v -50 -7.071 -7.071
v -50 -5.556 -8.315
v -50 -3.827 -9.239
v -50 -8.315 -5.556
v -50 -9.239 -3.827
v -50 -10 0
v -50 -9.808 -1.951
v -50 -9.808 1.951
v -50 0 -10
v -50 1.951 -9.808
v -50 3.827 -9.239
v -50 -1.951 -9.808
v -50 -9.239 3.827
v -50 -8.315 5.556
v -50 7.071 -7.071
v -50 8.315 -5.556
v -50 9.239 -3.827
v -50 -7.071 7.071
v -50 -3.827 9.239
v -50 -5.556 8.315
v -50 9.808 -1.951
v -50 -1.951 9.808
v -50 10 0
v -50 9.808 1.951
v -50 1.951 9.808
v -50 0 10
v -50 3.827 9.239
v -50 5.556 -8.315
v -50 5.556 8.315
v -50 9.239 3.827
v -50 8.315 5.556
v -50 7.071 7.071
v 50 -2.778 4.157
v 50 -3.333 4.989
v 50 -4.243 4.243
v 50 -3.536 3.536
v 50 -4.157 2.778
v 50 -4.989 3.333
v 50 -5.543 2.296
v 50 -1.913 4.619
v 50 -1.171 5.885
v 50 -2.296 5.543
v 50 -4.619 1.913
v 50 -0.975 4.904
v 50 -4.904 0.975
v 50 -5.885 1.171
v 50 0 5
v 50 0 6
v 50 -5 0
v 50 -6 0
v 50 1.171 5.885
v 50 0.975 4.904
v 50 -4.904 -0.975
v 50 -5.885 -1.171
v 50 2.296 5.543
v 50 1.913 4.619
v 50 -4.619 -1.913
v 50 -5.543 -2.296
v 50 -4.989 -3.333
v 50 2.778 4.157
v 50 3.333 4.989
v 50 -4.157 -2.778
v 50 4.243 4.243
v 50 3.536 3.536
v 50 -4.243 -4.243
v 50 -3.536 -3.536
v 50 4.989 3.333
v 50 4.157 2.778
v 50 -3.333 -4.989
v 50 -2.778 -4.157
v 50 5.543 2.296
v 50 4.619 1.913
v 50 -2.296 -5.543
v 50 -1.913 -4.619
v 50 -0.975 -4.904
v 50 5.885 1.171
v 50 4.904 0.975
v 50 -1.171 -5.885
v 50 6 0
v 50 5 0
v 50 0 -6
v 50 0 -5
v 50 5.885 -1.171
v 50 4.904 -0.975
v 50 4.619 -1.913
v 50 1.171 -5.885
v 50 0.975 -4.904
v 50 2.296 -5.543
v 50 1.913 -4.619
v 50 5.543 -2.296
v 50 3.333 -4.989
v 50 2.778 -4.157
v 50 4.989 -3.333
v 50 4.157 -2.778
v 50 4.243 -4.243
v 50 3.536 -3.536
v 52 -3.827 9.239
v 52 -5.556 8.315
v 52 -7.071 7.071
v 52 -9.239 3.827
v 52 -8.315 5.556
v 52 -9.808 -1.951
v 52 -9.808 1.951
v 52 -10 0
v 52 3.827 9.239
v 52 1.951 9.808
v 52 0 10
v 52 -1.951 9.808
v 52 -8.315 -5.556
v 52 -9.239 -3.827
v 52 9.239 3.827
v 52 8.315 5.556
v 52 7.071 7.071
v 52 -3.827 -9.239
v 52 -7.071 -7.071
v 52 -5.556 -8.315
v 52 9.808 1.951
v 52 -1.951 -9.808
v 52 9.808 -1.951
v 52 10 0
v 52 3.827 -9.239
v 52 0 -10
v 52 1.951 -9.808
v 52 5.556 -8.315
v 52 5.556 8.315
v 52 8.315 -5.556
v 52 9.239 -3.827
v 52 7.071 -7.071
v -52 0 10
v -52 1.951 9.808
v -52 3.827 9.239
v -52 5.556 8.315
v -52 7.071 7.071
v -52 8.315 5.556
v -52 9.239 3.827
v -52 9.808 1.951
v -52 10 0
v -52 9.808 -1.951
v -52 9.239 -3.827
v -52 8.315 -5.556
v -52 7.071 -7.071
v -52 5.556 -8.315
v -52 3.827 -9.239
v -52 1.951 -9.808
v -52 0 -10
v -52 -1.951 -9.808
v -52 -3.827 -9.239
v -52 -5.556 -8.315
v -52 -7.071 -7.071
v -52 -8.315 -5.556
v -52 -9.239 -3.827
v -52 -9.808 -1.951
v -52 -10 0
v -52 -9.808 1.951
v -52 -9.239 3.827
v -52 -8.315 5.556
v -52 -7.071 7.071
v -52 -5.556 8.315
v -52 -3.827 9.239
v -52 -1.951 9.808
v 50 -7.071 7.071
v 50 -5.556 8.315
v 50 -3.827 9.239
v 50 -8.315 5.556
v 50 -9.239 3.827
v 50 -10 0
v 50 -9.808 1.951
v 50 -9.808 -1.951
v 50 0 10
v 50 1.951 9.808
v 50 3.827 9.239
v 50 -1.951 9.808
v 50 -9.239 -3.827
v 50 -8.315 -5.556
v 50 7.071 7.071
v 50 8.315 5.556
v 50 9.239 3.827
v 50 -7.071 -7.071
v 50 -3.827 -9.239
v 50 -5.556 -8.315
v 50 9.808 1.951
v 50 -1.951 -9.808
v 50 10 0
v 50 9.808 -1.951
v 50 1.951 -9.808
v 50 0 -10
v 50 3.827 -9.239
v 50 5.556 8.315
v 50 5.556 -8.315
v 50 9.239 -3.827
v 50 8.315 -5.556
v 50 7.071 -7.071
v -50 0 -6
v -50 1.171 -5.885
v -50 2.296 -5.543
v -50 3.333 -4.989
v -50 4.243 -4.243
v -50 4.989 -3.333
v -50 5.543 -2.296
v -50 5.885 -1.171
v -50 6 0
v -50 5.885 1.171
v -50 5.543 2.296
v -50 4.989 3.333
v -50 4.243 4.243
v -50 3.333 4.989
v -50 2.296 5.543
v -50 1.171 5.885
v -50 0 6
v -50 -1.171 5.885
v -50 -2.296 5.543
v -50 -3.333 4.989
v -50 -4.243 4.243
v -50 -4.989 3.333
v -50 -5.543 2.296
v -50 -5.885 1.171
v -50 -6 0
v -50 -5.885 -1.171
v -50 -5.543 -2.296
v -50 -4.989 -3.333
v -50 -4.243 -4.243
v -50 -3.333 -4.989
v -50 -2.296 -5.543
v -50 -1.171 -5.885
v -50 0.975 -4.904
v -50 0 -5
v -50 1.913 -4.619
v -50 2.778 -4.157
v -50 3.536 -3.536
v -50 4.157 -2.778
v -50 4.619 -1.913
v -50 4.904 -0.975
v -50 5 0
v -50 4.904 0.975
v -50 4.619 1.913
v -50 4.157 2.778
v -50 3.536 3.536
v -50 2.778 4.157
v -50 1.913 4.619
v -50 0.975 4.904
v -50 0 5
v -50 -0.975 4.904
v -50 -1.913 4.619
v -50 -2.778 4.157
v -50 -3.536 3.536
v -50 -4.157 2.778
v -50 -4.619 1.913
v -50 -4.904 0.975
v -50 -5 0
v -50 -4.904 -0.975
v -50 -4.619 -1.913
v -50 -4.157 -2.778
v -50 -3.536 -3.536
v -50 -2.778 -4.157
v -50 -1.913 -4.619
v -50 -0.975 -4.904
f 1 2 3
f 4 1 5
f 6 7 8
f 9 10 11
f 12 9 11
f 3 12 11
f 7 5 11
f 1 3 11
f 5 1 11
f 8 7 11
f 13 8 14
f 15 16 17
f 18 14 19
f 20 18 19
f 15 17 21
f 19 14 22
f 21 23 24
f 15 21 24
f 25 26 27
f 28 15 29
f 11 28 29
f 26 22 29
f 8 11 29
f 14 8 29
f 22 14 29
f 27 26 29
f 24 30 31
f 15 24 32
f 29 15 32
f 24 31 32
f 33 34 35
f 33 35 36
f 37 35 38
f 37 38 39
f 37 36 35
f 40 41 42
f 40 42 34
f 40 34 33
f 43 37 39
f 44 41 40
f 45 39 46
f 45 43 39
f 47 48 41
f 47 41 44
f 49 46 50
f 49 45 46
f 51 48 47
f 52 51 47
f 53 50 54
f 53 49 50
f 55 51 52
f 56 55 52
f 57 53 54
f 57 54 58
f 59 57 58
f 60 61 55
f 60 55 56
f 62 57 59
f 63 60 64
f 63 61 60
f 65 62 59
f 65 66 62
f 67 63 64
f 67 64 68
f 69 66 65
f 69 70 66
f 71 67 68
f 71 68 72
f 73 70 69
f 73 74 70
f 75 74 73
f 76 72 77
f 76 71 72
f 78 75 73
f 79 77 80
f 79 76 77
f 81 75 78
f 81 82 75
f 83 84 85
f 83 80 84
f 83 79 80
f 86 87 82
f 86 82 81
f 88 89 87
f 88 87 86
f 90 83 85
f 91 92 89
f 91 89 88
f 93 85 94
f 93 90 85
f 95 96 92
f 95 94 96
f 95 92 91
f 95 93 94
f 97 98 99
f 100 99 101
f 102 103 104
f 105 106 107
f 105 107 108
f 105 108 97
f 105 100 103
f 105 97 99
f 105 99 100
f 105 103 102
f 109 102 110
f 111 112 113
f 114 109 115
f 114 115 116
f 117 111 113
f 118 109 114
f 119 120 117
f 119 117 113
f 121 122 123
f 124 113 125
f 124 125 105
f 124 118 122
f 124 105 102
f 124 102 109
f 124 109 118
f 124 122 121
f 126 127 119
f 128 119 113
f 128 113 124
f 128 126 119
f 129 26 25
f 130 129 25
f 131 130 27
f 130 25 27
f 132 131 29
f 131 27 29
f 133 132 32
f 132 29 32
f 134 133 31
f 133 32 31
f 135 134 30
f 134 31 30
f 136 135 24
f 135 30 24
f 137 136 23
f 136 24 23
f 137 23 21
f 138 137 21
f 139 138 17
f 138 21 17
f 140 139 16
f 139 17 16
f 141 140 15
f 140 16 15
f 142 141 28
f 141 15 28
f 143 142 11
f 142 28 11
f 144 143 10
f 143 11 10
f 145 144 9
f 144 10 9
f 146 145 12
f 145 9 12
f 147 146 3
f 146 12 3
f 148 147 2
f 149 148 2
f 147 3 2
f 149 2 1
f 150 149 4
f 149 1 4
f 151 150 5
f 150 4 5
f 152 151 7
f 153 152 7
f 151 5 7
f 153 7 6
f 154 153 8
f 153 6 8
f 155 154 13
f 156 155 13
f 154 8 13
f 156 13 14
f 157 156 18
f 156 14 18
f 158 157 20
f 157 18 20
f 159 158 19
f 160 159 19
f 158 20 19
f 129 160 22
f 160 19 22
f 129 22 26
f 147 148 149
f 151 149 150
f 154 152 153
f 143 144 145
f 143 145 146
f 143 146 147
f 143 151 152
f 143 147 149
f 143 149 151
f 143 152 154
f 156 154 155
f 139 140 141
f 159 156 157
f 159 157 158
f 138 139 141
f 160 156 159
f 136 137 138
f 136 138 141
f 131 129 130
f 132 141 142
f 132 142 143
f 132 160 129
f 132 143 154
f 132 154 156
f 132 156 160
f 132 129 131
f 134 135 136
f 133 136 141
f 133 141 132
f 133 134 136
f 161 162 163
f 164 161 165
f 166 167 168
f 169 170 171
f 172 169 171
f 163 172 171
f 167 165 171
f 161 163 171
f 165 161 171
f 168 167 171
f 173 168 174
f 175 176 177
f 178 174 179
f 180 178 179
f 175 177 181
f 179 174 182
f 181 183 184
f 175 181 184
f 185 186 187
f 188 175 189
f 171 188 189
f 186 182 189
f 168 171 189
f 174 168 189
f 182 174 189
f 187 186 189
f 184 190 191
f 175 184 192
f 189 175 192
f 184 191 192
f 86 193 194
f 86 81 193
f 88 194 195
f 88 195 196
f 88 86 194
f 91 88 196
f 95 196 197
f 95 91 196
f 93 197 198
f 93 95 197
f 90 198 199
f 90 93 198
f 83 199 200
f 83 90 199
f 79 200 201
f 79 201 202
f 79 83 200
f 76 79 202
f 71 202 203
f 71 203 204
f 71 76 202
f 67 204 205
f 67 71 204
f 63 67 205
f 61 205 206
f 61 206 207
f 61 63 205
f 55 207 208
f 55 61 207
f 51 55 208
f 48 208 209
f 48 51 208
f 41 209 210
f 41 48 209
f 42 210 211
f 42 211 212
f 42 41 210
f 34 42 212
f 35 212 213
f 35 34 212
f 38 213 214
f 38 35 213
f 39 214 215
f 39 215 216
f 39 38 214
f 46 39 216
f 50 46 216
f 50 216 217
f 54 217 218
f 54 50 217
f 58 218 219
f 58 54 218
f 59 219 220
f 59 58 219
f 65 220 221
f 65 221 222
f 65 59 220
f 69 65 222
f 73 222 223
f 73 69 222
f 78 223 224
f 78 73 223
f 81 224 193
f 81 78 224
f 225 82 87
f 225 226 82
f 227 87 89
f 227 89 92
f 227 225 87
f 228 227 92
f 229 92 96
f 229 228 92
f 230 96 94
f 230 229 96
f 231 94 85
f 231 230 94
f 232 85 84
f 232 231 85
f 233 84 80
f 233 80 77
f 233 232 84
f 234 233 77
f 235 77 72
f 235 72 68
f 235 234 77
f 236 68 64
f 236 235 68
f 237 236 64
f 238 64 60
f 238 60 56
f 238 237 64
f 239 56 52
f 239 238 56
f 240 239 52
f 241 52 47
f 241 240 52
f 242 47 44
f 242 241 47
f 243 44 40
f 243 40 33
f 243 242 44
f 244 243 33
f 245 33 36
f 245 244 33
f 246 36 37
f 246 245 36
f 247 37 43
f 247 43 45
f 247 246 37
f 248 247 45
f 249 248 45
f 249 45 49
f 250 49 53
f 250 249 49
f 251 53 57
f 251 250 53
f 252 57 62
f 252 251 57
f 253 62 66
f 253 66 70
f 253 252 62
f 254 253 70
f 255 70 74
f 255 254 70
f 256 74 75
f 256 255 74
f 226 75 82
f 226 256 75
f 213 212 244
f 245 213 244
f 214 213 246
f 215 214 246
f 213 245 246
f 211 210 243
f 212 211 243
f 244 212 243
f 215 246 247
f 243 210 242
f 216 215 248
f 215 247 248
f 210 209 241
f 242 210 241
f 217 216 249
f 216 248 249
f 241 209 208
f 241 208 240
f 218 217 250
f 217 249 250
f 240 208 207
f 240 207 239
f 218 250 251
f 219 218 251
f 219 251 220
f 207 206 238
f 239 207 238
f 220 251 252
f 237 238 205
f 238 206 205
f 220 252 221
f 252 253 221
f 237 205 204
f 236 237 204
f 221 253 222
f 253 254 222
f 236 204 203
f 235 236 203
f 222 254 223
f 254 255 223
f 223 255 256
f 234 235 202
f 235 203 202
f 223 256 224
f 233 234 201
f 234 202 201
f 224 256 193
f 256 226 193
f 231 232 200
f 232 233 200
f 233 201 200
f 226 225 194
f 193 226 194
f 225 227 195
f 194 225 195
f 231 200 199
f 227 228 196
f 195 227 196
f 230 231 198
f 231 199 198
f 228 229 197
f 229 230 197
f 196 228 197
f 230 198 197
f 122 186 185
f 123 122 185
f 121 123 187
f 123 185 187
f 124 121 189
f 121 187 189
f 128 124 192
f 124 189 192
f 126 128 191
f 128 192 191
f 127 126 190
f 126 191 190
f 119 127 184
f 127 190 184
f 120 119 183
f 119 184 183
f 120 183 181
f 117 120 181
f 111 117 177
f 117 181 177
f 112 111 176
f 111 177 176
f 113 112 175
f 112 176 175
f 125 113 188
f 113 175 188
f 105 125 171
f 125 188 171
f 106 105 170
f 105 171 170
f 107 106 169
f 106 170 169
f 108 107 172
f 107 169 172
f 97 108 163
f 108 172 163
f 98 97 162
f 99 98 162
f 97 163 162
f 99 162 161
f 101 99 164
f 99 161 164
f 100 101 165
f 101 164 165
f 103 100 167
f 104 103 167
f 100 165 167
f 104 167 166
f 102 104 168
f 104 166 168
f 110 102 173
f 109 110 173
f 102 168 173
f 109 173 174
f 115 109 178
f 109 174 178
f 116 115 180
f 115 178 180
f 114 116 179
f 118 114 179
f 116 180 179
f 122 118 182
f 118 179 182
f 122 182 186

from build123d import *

# Parameters (mm, degrees)
SKETCH1_R           = 6
SKETCH1_R_2         = 5
BOSS_EXTRUDE1_DEPTH = 50
SKETCH2_R           = 10
BOSS_EXTRUDE4_DEPTH = 2
SKETCH5_R           = 10
BOSS_EXTRUDE5_DEPTH = 2


with BuildPart() as part:
    # Sketch1 → Boss-Extrude1 (new body, symmetric)
    with BuildSketch(Plane(origin=(0, 0, 0), x_dir=(0, 0, -1), z_dir=(1, 0, 0))):
        Circle(SKETCH1_R)
        Circle(SKETCH1_R_2, mode=Mode.SUBTRACT)
    extrude(amount=BOSS_EXTRUDE1_DEPTH, both=True)


with BuildPart() as body_2:
    # Sketch2 → Boss-Extrude4 (new body)
    with BuildSketch(Plane.ZY.offset(50)):
        Circle(SKETCH2_R)
    extrude(amount=BOSS_EXTRUDE4_DEPTH)


with BuildPart() as body_3:
    # Sketch5 → Boss-Extrude5 (new body)
    with BuildSketch(Plane(origin=(50, 0, 0), x_dir=(0, 0, -1), z_dir=(1, 0, 0))):
        Circle(SKETCH5_R)
    extrude(amount=BOSS_EXTRUDE5_DEPTH)


solid = Compound([part.part, body_2.part, body_3.part])
